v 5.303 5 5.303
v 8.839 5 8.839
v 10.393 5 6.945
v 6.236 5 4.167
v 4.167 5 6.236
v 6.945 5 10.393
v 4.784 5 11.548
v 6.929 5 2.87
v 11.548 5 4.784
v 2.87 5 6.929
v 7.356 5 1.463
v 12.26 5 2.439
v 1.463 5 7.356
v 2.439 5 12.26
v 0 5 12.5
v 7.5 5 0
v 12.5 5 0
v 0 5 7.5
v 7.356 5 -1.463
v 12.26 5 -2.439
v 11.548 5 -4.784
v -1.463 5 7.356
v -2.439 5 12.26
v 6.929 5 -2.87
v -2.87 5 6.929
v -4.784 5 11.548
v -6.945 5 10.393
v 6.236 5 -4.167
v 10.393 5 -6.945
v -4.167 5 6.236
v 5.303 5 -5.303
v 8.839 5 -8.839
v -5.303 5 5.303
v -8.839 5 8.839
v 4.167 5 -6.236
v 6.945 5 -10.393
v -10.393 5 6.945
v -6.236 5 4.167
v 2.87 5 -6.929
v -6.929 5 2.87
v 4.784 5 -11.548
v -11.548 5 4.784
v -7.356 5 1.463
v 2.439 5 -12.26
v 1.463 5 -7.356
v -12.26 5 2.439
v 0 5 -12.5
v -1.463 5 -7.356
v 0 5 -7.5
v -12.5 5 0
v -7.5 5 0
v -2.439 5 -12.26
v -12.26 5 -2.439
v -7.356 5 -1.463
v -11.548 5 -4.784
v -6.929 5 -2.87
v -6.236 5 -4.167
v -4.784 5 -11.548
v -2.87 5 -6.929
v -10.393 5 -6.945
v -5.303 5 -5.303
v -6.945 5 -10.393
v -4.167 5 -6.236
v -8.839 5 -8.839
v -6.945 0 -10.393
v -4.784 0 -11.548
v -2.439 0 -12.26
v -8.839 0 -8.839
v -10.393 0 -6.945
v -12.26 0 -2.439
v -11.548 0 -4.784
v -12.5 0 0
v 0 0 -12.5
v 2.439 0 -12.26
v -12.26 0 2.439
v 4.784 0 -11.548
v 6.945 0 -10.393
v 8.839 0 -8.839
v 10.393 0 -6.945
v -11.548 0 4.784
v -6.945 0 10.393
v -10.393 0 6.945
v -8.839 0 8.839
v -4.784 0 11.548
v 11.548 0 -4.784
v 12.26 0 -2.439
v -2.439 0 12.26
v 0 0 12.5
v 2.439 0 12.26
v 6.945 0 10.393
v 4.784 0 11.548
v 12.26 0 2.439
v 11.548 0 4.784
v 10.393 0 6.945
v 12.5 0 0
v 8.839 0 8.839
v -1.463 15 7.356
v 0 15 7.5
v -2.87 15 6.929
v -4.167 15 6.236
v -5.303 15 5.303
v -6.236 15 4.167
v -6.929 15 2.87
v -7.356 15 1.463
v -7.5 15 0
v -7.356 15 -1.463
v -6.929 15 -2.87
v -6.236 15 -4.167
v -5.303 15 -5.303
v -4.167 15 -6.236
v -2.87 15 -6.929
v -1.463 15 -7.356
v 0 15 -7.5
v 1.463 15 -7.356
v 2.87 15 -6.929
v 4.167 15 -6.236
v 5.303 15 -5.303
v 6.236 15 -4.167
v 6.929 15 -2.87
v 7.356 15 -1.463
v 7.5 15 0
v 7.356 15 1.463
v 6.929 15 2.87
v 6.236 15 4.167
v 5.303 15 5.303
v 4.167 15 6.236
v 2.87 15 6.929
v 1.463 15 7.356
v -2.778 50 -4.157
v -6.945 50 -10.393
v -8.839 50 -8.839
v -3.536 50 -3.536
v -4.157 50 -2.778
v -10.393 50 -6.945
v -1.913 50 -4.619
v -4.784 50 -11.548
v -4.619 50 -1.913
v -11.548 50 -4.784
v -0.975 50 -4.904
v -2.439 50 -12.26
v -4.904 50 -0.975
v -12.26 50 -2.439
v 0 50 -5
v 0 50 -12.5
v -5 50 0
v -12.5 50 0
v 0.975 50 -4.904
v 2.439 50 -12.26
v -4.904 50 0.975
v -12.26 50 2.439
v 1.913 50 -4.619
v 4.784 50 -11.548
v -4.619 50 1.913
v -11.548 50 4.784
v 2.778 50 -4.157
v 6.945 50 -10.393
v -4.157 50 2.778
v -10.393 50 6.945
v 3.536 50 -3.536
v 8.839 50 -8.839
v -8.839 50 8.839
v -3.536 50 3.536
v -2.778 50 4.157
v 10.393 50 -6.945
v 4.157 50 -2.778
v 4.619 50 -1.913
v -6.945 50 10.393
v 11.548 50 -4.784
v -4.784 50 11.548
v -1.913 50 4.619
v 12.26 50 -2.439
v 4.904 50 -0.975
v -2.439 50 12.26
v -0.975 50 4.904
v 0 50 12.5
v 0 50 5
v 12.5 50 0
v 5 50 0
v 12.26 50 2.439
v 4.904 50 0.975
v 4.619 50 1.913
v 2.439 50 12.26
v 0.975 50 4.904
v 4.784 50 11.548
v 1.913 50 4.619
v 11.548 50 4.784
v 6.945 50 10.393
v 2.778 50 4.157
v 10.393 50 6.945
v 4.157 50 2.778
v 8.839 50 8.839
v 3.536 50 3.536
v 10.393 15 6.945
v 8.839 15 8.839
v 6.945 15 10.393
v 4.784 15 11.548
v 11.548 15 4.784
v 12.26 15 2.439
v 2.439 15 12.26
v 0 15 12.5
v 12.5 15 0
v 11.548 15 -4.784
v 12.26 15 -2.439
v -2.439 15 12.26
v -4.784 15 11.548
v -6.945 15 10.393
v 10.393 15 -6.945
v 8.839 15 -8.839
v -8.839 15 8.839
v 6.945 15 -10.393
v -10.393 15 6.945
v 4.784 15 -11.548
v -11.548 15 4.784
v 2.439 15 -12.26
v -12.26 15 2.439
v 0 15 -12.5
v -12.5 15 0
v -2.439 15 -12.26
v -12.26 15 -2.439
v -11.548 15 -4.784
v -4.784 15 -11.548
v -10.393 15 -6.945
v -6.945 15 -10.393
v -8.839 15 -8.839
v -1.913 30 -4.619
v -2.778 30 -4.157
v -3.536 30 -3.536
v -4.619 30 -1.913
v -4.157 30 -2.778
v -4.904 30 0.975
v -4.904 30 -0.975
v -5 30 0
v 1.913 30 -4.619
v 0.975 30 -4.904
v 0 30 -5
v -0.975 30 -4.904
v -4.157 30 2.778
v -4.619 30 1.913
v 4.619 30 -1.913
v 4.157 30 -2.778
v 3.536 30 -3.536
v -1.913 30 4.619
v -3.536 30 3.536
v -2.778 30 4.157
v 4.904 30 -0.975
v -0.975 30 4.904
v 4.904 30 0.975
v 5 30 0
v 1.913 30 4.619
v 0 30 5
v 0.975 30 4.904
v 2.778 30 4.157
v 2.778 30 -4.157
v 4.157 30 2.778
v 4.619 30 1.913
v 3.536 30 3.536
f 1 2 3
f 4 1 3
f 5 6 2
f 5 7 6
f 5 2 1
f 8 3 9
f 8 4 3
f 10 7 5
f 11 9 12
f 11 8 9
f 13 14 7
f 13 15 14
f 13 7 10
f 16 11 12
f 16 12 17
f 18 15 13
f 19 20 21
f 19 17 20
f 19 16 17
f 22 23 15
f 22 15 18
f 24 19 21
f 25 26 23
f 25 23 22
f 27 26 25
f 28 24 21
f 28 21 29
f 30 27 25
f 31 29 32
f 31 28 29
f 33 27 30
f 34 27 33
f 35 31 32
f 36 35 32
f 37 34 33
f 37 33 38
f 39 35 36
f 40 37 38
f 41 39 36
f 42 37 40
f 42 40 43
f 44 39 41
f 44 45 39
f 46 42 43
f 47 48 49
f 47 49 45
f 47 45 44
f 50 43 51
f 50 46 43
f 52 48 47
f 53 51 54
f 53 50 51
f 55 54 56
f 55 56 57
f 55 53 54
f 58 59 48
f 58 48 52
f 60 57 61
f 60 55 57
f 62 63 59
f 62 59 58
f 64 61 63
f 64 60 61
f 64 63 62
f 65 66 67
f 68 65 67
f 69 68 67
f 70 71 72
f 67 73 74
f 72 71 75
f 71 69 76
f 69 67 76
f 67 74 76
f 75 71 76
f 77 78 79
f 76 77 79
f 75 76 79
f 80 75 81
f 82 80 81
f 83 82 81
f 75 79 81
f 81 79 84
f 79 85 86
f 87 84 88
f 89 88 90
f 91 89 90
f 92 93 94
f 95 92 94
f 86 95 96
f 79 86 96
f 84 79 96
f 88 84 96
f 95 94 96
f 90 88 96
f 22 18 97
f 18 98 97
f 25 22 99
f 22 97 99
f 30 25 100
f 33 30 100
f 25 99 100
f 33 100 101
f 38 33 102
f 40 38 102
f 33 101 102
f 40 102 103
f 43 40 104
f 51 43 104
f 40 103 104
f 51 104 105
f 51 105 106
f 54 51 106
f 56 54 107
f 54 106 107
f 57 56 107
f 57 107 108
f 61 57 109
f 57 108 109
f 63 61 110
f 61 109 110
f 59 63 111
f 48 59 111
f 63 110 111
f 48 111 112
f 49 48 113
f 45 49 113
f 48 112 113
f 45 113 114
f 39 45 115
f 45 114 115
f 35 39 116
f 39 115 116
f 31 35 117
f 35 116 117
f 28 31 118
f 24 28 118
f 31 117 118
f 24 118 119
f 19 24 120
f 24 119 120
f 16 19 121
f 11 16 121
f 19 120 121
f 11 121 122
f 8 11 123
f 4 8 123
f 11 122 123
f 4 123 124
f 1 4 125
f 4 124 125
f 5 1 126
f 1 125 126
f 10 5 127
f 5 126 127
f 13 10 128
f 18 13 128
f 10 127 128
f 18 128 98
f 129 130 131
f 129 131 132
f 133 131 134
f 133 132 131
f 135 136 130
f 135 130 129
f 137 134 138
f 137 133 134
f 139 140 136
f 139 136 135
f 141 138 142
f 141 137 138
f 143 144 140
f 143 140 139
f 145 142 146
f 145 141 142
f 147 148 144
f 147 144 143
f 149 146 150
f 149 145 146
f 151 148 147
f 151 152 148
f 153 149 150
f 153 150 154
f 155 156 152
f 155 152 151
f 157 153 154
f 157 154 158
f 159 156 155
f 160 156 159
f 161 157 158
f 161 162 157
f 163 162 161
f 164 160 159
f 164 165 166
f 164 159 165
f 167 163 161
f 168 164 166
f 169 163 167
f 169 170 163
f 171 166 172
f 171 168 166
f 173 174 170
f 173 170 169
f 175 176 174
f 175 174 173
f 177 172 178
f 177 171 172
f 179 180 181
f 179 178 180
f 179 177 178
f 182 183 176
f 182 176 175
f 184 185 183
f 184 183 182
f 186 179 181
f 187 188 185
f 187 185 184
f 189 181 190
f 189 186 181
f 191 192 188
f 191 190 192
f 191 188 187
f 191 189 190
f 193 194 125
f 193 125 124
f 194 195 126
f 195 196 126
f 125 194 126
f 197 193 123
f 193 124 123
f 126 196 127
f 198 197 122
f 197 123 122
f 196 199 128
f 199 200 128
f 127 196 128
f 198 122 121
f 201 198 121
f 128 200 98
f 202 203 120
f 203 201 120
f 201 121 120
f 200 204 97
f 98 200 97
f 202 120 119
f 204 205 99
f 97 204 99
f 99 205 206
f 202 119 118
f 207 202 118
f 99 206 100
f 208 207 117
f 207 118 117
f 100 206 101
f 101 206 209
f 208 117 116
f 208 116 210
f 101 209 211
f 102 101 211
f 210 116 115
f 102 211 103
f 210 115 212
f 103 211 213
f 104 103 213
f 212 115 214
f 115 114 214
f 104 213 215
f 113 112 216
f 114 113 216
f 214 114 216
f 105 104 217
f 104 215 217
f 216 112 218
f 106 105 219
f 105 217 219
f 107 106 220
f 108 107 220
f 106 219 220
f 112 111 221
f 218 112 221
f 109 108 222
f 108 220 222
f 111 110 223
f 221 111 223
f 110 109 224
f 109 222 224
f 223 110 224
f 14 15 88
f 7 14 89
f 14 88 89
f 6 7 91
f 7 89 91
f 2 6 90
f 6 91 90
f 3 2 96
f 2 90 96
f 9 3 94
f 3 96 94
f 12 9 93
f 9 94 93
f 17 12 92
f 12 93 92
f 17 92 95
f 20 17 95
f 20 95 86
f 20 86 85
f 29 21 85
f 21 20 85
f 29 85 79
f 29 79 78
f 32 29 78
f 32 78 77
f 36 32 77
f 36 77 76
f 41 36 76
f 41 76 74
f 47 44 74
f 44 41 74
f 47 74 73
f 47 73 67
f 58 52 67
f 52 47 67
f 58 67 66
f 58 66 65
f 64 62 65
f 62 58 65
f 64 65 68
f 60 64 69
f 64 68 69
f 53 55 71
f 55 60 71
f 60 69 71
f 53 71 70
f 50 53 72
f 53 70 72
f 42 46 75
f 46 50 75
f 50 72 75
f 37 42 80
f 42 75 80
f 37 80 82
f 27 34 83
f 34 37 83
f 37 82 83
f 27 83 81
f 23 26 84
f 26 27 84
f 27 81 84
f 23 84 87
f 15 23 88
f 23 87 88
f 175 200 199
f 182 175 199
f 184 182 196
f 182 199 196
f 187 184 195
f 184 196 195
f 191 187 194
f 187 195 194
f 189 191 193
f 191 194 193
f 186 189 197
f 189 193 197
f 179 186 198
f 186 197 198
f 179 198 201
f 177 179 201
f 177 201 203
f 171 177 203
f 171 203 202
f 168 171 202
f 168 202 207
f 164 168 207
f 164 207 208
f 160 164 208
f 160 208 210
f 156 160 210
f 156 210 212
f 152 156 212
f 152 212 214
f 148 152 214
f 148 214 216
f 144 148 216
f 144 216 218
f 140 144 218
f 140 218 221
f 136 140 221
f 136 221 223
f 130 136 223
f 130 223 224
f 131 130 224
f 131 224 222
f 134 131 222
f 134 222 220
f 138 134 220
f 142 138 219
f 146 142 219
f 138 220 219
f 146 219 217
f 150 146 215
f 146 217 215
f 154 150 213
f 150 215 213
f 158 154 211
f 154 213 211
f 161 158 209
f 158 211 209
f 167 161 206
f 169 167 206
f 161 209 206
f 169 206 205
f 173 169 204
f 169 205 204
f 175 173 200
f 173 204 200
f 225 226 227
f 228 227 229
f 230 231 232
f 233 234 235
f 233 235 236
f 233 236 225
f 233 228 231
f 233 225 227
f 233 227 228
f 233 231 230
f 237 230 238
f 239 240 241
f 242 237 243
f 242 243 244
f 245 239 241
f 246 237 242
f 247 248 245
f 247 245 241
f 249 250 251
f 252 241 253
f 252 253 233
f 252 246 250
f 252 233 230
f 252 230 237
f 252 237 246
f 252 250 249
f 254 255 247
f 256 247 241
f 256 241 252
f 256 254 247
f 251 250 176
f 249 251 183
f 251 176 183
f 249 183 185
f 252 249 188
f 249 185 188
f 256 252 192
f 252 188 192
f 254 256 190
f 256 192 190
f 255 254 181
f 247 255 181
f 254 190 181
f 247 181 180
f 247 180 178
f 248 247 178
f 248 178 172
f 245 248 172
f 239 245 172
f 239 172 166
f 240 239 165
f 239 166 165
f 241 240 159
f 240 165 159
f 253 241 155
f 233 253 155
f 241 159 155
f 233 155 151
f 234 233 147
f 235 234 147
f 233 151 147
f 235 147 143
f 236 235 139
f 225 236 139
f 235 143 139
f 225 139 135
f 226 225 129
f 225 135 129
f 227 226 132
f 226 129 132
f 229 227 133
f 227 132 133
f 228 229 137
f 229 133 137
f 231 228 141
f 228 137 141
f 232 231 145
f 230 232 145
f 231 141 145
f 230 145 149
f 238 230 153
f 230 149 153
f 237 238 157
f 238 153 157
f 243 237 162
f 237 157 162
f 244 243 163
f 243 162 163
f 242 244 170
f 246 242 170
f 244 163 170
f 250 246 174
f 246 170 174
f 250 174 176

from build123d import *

# Parameters (mm, degrees)
SKETCH1_R           = 12.5
BOSS_EXTRUDE1_DEPTH = 50
SKETCH2_R           = 5
CUT_EXTRUDE1_DEPTH  = 20
SKETCH3_W           = 5
SKETCH3_H           = 10


with BuildPart() as part:
    # Sketch1 → Boss-Extrude1 (new body)
    with BuildSketch(Plane(origin=(0, 0, 0), x_dir=(1, 0, 0), z_dir=(0, 1, 0))):
        with Locations(Location((0, 0, 0), (0, 0, 270))):
            Circle(SKETCH1_R)
    extrude(amount=BOSS_EXTRUDE1_DEPTH)

    # Sketch2 → Cut-Extrude1 (cut)
    with BuildSketch(Plane(origin=(0, 50, 0), x_dir=(1, 0, 0), z_dir=(0, 1, 0))):
        with Locations(Location((0, 0, 0), (0, 0, 270))):
            Circle(SKETCH2_R)
    extrude(amount=-CUT_EXTRUDE1_DEPTH, mode=Mode.SUBTRACT)

    # Sketch3 → Cut-Revolve1 (revolve, cut)
    with BuildSketch(Plane(origin=(0, 0, 0), x_dir=(0, 0, -1), z_dir=(1, 0, 0)), mode=Mode.PRIVATE) as cut_revolve1_sk:
        with Locations((10, 10)):
            Rectangle(SKETCH3_W, SKETCH3_H)
    revolve(cut_revolve1_sk.sketch.rotate(Axis((0, 58.266357572, 0), (0, -1, 0)), 180), axis=Axis((0, 58.266357572, 0), (0, -1, 0)), mode=Mode.SUBTRACT)


solid = part.part
